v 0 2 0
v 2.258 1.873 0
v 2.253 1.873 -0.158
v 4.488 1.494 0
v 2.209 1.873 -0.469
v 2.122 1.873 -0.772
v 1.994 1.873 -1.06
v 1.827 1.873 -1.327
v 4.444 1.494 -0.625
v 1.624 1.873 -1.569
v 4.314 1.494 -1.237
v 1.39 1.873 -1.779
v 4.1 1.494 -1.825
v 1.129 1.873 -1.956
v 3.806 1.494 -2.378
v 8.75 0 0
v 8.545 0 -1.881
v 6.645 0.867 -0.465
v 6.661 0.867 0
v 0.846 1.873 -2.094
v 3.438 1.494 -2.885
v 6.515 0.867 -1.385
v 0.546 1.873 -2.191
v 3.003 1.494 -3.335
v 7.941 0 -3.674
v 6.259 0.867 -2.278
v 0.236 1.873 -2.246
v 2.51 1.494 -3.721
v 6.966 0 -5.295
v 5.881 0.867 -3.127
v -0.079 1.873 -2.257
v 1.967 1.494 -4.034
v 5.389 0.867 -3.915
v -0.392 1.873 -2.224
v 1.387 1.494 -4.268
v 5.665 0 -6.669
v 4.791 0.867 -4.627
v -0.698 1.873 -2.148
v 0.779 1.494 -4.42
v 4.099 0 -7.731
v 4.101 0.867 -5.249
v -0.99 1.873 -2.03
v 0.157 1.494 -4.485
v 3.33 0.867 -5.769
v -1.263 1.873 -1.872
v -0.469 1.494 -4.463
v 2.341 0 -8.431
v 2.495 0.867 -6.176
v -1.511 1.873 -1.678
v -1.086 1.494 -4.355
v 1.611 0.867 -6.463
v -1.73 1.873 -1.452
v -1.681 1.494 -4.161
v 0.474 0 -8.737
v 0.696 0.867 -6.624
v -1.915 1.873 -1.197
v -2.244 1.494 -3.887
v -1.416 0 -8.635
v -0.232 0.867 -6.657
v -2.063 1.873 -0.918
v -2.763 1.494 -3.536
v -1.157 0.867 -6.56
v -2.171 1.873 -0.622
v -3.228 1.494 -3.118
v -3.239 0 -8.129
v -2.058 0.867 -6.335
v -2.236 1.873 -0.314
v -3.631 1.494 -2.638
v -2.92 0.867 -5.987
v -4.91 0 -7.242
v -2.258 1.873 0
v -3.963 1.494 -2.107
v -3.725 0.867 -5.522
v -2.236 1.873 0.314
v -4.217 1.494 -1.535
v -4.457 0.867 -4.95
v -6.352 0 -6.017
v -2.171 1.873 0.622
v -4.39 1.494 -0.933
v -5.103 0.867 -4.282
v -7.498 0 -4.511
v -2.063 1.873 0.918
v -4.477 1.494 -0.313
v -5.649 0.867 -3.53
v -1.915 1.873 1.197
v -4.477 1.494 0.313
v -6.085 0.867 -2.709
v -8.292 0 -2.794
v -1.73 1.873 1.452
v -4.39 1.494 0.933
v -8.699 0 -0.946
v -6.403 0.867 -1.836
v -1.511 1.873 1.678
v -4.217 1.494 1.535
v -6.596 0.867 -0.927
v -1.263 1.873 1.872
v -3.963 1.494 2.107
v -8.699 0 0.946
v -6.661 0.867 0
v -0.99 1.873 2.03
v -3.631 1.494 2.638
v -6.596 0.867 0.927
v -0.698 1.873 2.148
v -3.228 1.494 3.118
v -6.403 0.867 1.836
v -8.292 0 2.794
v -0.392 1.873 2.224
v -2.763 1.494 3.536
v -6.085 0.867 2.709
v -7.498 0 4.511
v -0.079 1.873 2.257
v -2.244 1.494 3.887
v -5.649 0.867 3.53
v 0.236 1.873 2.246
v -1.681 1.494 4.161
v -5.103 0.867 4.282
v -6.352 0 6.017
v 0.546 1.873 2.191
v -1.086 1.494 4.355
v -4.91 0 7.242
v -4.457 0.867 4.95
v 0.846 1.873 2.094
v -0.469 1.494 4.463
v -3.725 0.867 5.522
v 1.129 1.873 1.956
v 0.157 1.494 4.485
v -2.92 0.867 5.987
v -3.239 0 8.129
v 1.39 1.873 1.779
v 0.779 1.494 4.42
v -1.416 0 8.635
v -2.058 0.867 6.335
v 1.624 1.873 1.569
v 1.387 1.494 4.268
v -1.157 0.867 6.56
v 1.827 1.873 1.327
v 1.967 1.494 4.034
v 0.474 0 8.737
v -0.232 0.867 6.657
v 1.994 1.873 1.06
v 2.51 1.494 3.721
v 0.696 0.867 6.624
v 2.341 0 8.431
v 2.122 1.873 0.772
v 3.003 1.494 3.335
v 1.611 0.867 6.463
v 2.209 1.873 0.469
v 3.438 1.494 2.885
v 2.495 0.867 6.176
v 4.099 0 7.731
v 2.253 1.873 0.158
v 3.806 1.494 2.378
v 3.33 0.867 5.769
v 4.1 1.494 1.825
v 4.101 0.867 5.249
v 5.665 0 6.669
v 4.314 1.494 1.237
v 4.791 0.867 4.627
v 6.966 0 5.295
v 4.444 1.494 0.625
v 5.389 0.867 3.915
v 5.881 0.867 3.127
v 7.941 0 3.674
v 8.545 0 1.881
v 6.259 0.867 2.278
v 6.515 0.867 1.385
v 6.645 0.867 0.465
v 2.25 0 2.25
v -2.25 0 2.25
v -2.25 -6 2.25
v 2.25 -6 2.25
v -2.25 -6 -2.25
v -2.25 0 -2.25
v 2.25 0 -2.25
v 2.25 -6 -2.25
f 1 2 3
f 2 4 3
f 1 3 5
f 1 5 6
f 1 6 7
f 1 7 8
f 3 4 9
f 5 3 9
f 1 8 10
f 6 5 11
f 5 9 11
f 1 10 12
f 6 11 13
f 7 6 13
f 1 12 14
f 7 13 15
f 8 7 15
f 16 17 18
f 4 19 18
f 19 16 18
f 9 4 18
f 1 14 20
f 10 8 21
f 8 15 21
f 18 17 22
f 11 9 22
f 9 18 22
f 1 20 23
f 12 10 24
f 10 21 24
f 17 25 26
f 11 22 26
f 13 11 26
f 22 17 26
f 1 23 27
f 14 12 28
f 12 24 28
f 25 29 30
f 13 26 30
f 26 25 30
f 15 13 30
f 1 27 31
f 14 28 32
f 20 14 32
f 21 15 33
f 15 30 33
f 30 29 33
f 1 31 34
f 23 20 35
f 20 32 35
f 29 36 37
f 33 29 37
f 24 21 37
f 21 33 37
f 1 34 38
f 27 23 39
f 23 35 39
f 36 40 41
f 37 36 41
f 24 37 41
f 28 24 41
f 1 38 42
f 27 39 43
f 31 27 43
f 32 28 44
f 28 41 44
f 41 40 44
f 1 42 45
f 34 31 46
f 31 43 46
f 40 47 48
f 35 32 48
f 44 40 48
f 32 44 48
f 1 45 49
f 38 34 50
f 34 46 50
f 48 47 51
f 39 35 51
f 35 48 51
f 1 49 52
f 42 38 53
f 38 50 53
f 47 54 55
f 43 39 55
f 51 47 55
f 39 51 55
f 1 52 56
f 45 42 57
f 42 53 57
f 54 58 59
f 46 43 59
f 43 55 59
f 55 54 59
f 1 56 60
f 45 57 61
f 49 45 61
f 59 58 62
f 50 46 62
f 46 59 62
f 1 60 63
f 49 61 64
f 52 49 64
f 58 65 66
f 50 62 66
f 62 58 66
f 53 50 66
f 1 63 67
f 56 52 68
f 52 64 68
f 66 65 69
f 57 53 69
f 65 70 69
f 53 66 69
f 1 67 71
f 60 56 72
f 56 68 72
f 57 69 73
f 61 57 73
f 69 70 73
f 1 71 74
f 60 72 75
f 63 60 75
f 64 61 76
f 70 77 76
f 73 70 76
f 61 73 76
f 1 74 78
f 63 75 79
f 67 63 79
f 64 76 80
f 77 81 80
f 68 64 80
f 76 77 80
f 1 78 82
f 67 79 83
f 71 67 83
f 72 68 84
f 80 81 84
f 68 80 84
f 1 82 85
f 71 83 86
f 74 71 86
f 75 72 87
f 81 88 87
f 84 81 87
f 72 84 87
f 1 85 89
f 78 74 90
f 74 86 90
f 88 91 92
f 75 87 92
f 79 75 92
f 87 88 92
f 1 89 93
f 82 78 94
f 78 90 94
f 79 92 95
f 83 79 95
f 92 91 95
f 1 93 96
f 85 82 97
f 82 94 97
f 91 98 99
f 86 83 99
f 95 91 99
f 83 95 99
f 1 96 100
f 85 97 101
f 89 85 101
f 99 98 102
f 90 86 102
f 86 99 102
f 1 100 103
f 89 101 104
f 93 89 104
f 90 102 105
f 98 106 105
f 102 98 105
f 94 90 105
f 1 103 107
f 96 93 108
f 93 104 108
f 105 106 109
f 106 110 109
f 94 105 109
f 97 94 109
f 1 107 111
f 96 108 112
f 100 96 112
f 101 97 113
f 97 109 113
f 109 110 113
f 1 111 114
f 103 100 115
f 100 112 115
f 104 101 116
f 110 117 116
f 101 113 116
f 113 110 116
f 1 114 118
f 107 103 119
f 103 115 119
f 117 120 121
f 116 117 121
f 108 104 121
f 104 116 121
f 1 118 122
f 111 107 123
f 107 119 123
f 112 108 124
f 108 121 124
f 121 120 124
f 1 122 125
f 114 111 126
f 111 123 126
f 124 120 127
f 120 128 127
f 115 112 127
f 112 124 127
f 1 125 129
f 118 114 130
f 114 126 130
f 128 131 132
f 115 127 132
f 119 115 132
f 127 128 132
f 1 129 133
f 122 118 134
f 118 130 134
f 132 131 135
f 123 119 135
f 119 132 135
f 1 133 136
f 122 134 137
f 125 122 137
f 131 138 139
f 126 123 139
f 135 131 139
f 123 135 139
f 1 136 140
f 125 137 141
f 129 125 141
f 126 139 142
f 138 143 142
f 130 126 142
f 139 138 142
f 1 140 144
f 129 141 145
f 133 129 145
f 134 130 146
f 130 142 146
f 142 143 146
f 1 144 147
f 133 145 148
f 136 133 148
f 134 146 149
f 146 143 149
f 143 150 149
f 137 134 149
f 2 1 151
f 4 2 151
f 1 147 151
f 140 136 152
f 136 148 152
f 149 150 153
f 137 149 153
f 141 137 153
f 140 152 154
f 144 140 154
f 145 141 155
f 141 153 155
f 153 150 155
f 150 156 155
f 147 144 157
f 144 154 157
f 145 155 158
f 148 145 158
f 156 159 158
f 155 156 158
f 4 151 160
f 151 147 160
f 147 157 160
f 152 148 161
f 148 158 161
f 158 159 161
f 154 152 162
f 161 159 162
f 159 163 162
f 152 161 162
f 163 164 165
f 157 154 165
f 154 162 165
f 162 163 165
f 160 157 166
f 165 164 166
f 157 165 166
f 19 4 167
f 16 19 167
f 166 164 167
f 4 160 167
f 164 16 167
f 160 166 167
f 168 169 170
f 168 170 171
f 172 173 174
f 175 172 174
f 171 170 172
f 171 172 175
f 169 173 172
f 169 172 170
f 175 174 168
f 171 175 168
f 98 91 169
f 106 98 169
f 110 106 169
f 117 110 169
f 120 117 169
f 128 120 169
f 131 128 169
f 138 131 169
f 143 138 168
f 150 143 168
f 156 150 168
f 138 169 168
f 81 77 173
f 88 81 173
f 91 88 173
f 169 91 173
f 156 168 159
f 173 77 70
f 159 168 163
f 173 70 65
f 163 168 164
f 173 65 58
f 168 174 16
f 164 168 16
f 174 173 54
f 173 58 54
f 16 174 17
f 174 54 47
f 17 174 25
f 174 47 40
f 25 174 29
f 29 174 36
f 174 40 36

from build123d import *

# Parameters (mm, degrees)
SKETCH2_W      = 4.5
SKETCH2_H      = 4.5
EXTRUDE1_DEPTH = 6


with BuildPart() as part:
    # Sketch1 → Revolve1 (revolve)
    with BuildSketch(Plane.XY):
        with BuildLine():
            Line((0, 0), (0, 2))
            ThreePointArc((0, 2), (4.487830768, 1.493634609), (8.75, 0))
            Line((8.75, 0), (0, 0))
        make_face()
    revolve(axis=Axis((0, 0, 0), (0, 1, 0)))

    # Sketch2 → Extrude1 (add)
    with BuildSketch(Plane.XZ):
        Rectangle(SKETCH2_W, SKETCH2_H)
    extrude(amount=EXTRUDE1_DEPTH)


solid = part.part
